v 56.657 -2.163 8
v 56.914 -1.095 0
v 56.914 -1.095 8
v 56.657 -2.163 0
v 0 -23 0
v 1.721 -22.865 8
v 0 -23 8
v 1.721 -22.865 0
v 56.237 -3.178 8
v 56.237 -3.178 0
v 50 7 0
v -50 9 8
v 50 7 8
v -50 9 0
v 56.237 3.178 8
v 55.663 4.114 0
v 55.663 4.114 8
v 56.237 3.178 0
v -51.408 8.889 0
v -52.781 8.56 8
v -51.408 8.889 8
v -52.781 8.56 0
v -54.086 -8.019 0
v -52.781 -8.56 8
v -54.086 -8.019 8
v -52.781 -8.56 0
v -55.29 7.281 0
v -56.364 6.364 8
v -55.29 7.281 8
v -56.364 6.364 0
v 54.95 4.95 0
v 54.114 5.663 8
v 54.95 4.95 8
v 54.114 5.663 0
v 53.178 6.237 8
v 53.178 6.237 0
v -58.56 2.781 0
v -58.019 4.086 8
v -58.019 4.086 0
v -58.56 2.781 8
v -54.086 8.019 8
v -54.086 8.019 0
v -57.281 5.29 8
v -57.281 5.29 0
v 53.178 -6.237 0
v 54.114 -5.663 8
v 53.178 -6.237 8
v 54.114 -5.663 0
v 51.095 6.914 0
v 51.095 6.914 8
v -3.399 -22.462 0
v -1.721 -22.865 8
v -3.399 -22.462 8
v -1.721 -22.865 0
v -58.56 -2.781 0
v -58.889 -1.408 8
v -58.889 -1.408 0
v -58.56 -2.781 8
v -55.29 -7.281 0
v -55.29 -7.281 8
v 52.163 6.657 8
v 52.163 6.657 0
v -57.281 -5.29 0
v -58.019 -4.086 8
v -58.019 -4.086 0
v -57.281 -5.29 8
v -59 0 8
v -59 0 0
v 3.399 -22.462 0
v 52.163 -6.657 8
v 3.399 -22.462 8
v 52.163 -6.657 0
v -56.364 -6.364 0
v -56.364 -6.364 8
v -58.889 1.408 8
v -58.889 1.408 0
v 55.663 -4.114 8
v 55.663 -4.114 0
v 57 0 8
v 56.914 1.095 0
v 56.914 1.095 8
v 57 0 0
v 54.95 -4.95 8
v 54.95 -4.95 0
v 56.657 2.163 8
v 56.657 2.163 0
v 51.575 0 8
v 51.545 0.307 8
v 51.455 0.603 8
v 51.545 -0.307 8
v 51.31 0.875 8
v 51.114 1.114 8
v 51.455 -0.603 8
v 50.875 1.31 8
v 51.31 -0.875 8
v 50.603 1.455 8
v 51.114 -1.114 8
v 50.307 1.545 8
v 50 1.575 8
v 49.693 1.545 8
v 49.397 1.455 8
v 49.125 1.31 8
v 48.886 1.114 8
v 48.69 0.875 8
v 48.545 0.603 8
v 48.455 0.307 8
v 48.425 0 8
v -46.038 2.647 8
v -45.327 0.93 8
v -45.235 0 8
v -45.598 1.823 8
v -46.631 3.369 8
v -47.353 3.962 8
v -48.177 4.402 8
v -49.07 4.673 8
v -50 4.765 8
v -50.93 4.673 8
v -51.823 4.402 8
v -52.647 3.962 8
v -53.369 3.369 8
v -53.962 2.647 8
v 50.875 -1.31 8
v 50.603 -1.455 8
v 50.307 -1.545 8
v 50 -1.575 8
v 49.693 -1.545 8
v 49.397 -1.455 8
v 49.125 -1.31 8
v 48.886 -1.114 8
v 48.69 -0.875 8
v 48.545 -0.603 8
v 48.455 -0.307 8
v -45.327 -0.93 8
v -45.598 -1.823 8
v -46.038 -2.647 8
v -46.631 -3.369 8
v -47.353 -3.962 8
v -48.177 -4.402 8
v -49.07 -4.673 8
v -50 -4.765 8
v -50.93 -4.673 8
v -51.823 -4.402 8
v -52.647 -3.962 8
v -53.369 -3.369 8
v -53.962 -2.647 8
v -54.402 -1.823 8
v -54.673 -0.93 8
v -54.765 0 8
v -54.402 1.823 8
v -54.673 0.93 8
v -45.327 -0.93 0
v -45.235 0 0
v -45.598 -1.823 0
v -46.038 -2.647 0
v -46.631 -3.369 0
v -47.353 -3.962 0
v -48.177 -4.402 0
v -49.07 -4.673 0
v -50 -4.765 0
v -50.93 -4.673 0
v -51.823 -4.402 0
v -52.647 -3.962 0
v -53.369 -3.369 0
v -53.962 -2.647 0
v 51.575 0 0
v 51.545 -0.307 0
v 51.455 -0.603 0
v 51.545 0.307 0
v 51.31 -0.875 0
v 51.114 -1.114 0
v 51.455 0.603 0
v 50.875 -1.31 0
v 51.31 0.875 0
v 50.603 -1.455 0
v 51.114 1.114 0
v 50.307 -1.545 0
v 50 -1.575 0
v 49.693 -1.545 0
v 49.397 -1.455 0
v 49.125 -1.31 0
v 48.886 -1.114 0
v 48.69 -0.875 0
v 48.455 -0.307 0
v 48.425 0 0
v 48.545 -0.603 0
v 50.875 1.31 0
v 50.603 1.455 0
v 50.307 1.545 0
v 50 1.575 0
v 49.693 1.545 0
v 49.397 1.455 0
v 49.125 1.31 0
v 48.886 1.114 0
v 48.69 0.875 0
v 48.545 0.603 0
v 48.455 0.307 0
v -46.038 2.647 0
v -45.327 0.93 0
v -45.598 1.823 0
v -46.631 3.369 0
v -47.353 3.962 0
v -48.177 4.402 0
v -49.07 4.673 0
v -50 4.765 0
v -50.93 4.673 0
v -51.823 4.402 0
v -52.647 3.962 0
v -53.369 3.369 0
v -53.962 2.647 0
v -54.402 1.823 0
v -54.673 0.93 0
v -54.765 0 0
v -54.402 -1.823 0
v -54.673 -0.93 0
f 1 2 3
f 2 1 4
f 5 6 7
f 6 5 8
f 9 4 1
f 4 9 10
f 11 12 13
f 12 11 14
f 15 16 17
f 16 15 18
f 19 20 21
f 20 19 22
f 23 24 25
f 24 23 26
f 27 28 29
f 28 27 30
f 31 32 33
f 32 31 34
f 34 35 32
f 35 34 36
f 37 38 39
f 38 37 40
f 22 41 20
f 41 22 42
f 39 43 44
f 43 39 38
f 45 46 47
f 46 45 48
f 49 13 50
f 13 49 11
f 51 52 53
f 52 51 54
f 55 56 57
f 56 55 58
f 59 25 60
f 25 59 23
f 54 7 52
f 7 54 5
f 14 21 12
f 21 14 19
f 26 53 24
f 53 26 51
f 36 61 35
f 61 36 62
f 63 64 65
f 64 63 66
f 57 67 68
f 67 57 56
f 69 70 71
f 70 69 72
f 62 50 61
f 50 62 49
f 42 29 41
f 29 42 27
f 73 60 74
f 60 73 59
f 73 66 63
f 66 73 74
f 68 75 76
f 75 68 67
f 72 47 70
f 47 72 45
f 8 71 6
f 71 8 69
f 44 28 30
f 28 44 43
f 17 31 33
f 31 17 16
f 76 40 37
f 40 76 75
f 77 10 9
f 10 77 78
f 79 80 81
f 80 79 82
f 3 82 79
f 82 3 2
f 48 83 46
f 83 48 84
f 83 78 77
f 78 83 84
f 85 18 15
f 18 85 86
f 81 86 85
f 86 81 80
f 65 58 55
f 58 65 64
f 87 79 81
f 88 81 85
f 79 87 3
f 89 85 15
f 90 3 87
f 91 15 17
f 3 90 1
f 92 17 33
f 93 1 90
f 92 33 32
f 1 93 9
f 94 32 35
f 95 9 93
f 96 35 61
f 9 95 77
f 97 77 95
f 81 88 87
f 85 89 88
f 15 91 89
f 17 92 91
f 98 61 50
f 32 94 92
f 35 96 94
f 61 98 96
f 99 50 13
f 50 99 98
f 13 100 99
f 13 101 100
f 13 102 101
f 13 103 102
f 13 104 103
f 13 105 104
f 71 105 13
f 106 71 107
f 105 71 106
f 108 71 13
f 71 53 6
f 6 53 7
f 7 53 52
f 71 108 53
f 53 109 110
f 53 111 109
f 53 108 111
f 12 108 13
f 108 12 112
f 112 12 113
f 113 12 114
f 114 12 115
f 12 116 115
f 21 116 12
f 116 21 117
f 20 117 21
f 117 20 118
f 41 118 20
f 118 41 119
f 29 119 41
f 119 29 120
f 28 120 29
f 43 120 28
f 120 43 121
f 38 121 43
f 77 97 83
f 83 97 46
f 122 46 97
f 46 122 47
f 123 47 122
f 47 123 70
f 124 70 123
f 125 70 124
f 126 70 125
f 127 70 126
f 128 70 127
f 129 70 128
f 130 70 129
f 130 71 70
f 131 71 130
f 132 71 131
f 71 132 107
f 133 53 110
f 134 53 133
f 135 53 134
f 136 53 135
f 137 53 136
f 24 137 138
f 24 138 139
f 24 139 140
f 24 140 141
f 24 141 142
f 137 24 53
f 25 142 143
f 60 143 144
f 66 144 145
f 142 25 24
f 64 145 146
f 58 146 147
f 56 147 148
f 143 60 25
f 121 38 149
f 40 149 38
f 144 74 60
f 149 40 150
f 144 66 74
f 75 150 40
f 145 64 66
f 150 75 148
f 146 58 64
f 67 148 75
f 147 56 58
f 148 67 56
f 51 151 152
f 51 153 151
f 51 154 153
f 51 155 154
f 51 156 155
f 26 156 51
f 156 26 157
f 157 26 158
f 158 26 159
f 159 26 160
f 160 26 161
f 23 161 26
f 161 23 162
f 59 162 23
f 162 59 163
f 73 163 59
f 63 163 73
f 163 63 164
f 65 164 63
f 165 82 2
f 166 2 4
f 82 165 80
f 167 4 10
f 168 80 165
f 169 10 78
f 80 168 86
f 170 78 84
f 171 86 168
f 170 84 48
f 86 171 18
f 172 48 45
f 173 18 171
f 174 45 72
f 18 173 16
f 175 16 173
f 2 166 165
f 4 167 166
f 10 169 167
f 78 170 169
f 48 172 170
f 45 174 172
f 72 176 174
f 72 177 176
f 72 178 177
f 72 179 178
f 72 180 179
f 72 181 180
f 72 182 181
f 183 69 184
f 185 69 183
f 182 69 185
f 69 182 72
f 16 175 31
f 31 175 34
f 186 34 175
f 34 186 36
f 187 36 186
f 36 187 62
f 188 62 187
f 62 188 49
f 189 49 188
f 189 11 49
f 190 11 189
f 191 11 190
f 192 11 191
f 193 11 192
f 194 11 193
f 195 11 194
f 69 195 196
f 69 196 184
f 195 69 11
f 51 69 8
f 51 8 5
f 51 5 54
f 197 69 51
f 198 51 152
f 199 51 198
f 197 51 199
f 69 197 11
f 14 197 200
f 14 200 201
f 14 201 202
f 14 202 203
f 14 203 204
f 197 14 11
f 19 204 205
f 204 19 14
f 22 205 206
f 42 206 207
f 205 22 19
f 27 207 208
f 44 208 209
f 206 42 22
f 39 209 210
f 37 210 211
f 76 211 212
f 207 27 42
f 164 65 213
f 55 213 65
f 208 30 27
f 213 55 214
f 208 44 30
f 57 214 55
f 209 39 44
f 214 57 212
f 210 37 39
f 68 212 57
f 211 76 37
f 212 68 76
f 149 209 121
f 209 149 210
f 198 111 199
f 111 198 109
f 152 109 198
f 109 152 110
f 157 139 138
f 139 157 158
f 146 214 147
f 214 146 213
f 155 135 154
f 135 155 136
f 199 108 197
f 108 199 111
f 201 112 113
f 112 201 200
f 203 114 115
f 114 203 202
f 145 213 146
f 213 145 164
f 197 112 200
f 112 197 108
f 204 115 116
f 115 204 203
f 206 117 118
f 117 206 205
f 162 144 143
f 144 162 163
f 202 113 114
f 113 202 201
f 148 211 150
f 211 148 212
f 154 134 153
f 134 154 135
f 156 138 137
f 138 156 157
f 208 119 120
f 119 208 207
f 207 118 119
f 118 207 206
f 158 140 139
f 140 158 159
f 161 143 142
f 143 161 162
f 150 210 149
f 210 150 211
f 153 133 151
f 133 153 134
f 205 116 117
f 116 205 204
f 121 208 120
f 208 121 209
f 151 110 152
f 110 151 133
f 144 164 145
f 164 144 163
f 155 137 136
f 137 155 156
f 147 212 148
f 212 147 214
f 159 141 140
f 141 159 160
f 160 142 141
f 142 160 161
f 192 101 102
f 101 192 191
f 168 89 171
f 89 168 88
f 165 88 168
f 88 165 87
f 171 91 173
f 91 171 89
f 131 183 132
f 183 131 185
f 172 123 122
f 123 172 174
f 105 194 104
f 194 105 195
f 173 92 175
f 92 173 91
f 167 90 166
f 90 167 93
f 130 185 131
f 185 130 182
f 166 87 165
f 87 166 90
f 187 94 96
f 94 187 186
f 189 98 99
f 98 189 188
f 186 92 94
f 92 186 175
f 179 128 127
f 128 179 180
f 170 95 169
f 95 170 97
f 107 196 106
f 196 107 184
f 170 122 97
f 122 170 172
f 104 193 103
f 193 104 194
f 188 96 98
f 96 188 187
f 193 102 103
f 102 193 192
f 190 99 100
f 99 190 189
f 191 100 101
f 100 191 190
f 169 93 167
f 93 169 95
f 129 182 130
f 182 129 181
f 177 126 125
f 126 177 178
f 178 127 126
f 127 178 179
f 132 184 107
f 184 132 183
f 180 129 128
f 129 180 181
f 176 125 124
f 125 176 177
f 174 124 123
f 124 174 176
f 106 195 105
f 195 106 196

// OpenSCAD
$fn = 32;

// ----------------------------------------------------------------------
// Lever: 100 mm between the bosses, 8 mm thick, smooth outline
// ----------------------------------------------------------------------

// --- parameters (mm) ---
lever_l = 100;            // distance between the boss centres
boss_a = 18;              // first boss diameter
boss_b = 14;              // second boss diameter
bore_a = 9.53;            // first bore
bore_b = 3.15;            // second bore
lever_t = 8;              // lever thickness
boss_c = 22;              // middle boss diameter
bend = 12;                // how far the middle boss drops

lever_profile = [[-59, 0], [-58.889, -1.408], [-58.56, -2.781], [-58.019, -4.086], [-57.281, -5.29], [-56.364, -6.364], [-55.29, -7.281], [-54.086, -8.019], [-52.781, -8.56], [-3.399, -22.462], [-1.721, -22.865], [0, -23], [1.721, -22.865], [3.399, -22.462], [52.163, -6.657], [53.178, -6.237], [54.114, -5.663], [54.95, -4.95], [55.663, -4.114], [56.237, -3.178], [56.657, -2.163], [56.914, -1.095], [57, 0], [56.914, 1.095], [56.657, 2.163], [56.237, 3.178], [55.663, 4.114], [54.95, 4.95], [54.114, 5.663], [53.178, 6.237], [52.163, 6.657], [51.095, 6.914], [50, 7], [-50, 9], [-51.408, 8.889], [-52.781, 8.56], [-54.086, 8.019], [-55.29, 7.281], [-56.364, 6.364], [-57.281, 5.29], [-58.019, 4.086], [-58.56, 2.781], [-58.889, 1.408]];

difference() {
  linear_extrude(height = lever_t) polygon(lever_profile);
  translate([-50, 0, -2.5]) cylinder(h = lever_t + 5, d = bore_a);
  translate([50, 0, -2.5]) cylinder(h = lever_t + 5, d = bore_b);
}
